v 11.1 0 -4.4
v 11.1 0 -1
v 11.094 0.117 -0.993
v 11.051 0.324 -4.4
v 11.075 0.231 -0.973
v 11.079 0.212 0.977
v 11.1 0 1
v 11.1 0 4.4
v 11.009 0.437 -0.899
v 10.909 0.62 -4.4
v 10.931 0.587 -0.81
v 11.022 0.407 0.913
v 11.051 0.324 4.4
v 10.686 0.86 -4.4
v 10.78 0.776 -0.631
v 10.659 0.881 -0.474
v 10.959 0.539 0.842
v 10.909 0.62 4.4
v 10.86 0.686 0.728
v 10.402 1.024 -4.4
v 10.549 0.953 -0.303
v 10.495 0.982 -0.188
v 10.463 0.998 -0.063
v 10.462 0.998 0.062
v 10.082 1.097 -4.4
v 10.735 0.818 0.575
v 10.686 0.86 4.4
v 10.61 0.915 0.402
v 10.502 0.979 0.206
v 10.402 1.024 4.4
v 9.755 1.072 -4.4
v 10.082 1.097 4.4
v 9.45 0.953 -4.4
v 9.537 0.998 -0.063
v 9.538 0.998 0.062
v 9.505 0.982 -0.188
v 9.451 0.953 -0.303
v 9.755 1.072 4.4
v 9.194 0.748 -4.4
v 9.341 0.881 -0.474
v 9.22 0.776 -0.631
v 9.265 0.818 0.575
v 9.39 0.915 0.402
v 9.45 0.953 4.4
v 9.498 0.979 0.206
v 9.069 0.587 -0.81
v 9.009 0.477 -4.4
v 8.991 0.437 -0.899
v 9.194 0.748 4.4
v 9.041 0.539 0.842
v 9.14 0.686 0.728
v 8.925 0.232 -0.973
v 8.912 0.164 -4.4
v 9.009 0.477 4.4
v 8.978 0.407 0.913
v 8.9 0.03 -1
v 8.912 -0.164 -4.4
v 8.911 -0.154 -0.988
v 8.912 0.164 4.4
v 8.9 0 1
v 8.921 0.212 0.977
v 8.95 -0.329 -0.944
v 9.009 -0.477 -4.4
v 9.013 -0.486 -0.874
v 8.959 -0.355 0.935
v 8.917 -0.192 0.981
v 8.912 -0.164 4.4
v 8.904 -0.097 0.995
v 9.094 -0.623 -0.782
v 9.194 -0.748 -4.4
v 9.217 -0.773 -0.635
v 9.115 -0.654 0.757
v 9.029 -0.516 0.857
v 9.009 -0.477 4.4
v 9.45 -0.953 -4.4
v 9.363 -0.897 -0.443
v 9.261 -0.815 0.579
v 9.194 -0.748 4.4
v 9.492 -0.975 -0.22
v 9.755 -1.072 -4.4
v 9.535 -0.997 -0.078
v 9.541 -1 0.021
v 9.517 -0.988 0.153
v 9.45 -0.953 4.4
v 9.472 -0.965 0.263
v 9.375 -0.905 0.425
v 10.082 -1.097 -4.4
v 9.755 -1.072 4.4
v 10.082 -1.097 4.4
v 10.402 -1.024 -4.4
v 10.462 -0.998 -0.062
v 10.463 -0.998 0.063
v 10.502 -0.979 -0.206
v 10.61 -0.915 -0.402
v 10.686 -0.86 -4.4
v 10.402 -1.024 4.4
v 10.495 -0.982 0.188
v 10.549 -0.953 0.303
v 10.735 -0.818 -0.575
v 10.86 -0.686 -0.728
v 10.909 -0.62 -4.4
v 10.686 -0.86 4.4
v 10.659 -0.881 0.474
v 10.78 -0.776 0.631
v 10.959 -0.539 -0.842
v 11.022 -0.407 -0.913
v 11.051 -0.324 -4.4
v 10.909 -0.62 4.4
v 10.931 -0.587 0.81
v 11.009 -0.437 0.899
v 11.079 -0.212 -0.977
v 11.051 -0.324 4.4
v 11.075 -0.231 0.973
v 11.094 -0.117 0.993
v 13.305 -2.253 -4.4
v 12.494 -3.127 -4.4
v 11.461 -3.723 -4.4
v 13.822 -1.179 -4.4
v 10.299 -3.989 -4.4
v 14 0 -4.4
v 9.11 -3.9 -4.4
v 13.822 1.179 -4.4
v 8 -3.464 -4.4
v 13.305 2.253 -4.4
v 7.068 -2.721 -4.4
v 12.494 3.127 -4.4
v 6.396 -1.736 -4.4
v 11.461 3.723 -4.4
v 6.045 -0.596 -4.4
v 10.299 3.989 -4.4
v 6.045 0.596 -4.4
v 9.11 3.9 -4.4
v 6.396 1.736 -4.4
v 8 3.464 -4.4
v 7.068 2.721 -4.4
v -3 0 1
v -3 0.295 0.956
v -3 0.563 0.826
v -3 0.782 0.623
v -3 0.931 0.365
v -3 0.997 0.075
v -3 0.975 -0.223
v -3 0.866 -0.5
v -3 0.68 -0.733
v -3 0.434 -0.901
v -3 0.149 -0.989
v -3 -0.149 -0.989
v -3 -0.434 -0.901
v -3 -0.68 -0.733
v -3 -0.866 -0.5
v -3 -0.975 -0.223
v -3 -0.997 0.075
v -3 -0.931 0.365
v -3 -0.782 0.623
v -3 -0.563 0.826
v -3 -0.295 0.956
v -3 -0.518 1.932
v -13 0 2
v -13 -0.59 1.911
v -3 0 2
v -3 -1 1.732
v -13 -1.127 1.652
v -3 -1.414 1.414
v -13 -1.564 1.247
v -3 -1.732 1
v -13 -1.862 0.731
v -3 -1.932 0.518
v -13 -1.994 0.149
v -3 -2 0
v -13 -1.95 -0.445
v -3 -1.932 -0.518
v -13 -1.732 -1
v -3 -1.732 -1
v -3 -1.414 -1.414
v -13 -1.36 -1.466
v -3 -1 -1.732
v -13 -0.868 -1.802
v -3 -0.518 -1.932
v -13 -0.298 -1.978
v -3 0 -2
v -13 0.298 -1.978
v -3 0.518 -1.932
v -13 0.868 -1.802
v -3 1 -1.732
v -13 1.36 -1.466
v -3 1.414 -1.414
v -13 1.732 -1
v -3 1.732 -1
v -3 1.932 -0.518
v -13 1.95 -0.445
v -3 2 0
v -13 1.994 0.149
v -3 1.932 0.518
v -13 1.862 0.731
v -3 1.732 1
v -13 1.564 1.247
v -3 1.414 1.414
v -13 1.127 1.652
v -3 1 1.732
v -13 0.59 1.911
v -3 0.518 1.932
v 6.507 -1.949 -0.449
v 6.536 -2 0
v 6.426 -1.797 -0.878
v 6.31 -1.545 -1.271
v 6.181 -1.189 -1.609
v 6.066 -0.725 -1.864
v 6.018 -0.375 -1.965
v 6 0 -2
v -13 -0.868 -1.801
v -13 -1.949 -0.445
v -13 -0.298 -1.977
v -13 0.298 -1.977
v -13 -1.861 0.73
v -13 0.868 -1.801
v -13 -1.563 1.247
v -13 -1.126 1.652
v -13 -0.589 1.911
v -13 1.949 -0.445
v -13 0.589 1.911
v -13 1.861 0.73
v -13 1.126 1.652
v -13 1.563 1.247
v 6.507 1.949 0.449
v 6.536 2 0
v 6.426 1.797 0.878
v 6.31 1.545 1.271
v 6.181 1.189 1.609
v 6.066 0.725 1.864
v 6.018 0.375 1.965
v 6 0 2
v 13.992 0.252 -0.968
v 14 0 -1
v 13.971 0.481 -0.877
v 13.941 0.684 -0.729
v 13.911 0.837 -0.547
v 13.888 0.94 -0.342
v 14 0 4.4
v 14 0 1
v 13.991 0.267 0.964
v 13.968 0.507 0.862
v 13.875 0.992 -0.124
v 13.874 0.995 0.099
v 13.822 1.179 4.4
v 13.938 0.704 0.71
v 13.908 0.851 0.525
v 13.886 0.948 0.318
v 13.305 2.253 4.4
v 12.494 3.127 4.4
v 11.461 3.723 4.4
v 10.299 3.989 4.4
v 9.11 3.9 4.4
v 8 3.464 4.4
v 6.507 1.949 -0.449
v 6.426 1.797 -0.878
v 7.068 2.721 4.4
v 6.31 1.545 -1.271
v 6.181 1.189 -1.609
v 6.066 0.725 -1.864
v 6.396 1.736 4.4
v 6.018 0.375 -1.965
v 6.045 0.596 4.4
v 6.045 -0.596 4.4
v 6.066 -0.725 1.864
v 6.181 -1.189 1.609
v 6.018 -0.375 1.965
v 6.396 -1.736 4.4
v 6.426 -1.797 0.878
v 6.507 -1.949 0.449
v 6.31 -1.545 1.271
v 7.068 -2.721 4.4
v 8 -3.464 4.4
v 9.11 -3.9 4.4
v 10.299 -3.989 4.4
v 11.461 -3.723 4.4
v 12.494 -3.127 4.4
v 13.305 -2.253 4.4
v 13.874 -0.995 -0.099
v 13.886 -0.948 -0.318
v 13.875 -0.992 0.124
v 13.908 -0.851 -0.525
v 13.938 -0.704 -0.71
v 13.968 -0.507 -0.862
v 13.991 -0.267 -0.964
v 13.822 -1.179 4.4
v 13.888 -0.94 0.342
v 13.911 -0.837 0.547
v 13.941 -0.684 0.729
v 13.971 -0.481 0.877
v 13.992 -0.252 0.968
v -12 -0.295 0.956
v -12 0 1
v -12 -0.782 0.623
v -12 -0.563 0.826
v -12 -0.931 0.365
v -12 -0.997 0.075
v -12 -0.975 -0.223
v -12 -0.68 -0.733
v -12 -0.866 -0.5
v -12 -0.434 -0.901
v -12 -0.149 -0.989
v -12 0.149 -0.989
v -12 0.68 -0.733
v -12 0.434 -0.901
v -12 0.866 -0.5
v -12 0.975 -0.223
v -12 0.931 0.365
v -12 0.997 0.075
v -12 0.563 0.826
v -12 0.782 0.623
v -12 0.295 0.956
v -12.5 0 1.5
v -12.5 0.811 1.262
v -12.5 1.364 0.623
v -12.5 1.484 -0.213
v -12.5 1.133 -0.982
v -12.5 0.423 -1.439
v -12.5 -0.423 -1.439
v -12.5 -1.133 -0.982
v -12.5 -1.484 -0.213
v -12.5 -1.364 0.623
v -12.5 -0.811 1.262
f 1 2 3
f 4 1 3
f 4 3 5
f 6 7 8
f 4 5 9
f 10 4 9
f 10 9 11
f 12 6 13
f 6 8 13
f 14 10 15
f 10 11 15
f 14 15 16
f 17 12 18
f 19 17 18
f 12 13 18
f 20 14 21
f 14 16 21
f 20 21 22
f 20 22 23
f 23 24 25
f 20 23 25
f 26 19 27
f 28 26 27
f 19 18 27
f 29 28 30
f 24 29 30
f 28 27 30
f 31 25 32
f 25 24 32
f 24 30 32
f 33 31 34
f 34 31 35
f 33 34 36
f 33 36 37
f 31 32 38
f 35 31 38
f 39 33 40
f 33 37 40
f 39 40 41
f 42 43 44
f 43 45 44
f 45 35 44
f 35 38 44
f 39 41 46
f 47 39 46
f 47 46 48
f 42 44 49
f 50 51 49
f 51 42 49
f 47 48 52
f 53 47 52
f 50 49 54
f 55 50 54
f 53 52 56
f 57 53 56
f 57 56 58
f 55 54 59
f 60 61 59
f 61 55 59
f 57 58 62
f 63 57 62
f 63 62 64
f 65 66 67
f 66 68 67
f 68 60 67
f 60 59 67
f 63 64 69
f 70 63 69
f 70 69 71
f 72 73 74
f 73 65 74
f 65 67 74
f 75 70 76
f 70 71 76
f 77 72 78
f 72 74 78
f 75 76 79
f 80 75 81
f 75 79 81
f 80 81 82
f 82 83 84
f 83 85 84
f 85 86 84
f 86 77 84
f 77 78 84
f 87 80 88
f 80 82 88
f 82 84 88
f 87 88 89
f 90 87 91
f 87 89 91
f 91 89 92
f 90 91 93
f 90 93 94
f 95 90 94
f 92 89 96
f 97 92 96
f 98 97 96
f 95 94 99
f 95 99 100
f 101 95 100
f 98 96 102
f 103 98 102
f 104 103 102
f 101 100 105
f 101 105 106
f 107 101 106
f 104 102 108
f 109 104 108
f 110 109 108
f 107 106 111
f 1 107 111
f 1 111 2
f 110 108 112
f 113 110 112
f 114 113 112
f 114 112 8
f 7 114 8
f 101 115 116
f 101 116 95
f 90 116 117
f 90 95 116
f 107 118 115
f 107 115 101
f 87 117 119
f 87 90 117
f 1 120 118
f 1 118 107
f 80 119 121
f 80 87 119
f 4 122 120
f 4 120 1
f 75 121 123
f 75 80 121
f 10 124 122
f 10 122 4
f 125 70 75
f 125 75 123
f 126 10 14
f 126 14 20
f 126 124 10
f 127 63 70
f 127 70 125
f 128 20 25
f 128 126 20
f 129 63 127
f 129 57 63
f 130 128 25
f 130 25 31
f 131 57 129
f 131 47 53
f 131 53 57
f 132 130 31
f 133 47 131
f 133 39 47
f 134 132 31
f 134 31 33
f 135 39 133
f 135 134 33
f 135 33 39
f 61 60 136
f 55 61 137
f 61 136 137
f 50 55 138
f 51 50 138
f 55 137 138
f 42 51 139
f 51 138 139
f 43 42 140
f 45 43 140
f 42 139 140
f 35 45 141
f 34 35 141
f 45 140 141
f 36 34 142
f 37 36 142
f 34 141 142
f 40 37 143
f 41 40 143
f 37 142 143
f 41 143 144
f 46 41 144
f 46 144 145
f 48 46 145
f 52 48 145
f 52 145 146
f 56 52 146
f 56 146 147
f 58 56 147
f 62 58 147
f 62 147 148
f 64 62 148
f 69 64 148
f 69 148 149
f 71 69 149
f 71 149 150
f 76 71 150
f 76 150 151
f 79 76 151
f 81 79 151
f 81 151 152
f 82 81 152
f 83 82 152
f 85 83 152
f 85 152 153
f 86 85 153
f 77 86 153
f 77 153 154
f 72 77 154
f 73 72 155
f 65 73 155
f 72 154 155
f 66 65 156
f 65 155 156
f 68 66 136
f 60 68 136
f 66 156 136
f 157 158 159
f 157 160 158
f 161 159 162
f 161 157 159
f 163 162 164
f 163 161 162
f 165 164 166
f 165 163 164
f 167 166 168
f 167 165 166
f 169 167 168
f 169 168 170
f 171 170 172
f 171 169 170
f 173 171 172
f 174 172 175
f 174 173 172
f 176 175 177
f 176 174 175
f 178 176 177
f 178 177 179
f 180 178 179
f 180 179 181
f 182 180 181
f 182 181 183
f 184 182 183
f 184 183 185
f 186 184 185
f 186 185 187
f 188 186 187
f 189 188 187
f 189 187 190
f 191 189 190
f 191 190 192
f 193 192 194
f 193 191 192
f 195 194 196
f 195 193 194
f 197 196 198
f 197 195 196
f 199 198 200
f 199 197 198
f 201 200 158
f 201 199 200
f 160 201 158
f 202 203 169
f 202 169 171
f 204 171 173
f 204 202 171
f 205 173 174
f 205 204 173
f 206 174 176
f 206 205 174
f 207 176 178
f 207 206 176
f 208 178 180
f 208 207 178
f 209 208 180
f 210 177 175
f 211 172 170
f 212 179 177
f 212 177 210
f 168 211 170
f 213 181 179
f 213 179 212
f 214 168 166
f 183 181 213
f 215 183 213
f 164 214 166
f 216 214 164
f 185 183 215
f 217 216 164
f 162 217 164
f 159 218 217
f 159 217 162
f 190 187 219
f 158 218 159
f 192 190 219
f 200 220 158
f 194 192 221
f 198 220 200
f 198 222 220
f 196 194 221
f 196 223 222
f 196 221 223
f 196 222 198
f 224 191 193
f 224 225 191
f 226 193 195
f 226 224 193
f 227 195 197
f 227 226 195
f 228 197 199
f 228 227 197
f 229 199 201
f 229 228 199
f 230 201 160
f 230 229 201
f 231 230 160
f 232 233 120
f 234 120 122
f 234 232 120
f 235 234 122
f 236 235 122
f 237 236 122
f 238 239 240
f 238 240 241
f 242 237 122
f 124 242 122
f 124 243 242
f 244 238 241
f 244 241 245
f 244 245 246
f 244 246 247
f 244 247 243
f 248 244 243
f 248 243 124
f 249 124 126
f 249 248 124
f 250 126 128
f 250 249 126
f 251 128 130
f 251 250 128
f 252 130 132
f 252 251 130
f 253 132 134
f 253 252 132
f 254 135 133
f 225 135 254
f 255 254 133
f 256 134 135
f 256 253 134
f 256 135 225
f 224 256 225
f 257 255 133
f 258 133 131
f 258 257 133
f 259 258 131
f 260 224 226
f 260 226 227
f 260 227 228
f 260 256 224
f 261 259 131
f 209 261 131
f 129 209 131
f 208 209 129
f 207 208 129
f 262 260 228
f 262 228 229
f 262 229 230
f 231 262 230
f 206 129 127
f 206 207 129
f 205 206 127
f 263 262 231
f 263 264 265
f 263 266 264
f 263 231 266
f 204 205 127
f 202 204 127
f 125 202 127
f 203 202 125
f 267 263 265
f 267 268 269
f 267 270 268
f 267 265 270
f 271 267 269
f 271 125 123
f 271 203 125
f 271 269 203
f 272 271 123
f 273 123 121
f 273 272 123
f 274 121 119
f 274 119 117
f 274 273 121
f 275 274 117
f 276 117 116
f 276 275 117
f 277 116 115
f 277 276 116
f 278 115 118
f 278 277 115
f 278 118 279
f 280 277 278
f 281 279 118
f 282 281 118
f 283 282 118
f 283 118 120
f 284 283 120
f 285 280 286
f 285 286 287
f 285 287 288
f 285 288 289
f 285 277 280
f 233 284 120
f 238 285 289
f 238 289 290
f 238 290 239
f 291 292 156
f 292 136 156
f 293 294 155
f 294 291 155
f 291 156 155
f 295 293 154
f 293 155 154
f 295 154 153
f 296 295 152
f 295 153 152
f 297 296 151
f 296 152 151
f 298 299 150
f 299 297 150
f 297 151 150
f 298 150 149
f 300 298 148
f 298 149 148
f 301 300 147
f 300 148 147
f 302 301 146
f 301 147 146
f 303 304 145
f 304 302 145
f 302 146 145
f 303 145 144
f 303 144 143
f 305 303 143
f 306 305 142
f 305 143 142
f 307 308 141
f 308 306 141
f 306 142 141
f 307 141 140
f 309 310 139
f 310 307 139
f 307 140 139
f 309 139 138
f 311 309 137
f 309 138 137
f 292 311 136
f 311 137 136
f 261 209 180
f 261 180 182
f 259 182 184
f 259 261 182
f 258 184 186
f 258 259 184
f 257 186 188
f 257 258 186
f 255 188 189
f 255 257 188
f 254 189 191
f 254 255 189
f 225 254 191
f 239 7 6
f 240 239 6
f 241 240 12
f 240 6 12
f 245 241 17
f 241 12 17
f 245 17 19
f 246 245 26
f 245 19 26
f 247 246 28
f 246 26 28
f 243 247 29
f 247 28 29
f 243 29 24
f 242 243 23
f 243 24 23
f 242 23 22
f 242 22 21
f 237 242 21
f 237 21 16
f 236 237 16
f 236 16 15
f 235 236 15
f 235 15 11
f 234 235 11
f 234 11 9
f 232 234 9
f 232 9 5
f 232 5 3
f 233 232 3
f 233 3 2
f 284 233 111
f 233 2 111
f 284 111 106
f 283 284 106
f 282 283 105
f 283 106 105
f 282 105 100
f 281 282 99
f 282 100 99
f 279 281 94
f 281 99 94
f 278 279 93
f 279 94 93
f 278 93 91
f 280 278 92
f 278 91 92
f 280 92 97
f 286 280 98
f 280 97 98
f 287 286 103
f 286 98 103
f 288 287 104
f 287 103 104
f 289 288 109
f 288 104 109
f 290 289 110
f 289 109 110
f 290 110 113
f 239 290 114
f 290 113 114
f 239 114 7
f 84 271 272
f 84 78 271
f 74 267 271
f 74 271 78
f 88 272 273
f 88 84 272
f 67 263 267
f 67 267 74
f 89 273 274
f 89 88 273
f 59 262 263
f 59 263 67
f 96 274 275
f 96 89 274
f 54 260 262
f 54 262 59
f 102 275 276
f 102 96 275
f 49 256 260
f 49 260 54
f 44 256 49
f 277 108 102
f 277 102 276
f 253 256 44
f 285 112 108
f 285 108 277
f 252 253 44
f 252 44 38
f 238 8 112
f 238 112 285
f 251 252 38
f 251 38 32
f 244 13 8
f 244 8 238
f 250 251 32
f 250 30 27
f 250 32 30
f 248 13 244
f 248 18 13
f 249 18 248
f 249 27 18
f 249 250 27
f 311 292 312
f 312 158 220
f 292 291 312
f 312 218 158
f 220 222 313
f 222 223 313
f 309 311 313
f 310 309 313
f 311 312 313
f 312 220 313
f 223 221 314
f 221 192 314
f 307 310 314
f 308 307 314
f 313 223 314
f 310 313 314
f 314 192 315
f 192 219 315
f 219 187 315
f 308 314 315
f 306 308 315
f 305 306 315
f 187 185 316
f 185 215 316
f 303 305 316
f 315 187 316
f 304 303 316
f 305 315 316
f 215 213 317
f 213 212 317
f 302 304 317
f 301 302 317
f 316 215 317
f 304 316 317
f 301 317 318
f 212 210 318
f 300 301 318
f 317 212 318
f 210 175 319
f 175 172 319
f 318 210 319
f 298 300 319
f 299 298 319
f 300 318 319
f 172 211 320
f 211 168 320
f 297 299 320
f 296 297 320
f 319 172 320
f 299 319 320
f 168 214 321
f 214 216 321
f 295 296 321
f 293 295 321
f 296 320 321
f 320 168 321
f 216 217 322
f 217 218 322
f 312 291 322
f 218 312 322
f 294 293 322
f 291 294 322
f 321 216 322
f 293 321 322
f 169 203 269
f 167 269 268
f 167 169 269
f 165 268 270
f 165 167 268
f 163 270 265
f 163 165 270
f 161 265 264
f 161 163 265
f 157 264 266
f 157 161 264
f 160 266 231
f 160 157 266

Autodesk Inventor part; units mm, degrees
ref_plane "YZ Plane" through (0, 0, 0) normal (1, 0, 0) x (0, 1, 0)
ref_plane "XZ Plane" through (0, 0, 0) normal (0, 1, 0) x (-1, 0, 0)
ref_plane "XY Plane" through (0, 0, 0) normal (0, 0, 1) x (1, 0, 0)
sketch "Sketch1" plane through (0, 0, 0) normal (0, 0, 1) x (1, 0, 0)
  circle A0 centre (-10, 0) radius 1
  circle A1 centre (10, 0) radius 1
  circle A2 centre (-10, 0) radius 4
  circle A3 centre (10, 0) radius 4
  point P0 (0, 0)
  dimension "d0" = 2
  dimension "d1" = 2
  dimension "d3" = 20
  dimension "d4" = 10
  dimension "d5" = 8
  dimension "d6" = 8
extrude "Extrusion1" add sketch "Sketch1" against normal mid plane 18
sketch "Sketch2" plane through (0, 0, 0) normal (0, 0, 1) x (1, 0, 0)
  circle A0 centre (-10, 0) radius 4 projected
  circle A1 centre (-10, 0) radius 1 projected
  point P0 (0, 0)
extrude "Extrusion2" cut sketch "Sketch2" against normal mid plane 9
sketch "Sketch3" plane through (-10, 0, -4.5) normal (0, 0, 1) x (1, 0, 0)
  circle A0 centre (20, 0) radius 4 projected
  circle A1 centre (20, 0) radius 4 projected
  circle A2 centre (20, 0) radius 1 projected
  point P0 (10, 0)
extrude "Extrusion3" cut sketch "Sketch3" against normal blind 4.5
mirror "Mirror1" about plane through (0, 0, 0) normal (0, 0, 1) of "Extrusion3"
sketch "Sketch6" plane through (0, 0, 0) normal (0, 1, 0) x (-1, 0, 0)
  line L0 (-6, -4.5) -> (-9, -4.5) construction
  line L1 (-9, -4.5) -> (-9, 4.5) construction
  line L2 (-9, 4.5) -> (-6, 4.5) construction
  line L3 (-6, 4.5) -> (-6, -4.5) construction
  line L4 (-11, -4.5) -> (-14, -4.5) construction
  line L5 (-14, -4.5) -> (-14, 4.5) construction
  line L6 (-14, 4.5) -> (-11, 4.5) construction
  line L7 (-11, 4.5) -> (-11, -4.5) construction
  line L8 (6, 9) -> (9, 9) construction
  line L9 (9, 9) -> (9, 4.5) construction
  line L10 (9, 4.5) -> (6, 4.5) construction
  line L11 (6, 4.5) -> (6, 9) construction
  line L12 (11, 9) -> (14, 9) construction
  line L13 (14, 9) -> (14, 4.5) construction
  line L14 (14, 4.5) -> (11, 4.5) construction
  line L15 (11, 4.5) -> (11, 9) construction
  line L16 (14, -9) -> (11, -9) construction
  line L17 (11, -9) -> (11, -4.5) construction
  line L18 (11, -4.5) -> (14, -4.5) construction
  line L19 (14, -4.5) -> (14, -9) construction
  line L20 (9, -9) -> (6, -9) construction
  line L21 (6, -9) -> (6, -4.5) construction
  line L22 (6, -4.5) -> (9, -4.5) construction
  line L23 (9, -4.5) -> (9, -9) construction
  line L24 (6, -9) -> (14, -9) construction
  line L25 (6, -9) -> (3, -9)
  line L26 (3, -9) -> (3, -2)
  line L27 (3, -2) -> (-6, -2)
  line L28 (-6, 4.5) -> (-6, -4.5) construction
  line L29 (-6, 2) -> (3, 2)
  line L30 (3, 2) -> (3, 9)
  line L31 (3, 9) -> (6, 9)
  line L32 (6, -4.5) -> (14, -4.5) construction
  line L33 (6, -4.5) -> (6, 4.5)
  line L34 (-6, -2) -> (-9, -2)
  line L35 (-9, -4.5) -> (-9, 4.5) projected
  line L36 (-6, 2) -> (-9, 2)
  line L37 (6, -9) -> (9, -9)
  line L38 (9, -4.5) -> (6, -4.5)
  line L39 (11, -4.5) -> (9, -4.5) projected
  line L40 (9, -4.5) -> (9, -9)
  line L41 (9, -9) -> (9, -4.5) projected
  line L42 (9, 4.5) -> (11, 4.5) projected
  line L43 (14, 4.5) -> (6, 4.5) projected
  line L44 (9, 4.5) -> (6, 4.5)
  line L45 (9, 9) -> (11, 9) projected
  line L46 (9, 4.5) -> (9, 9)
  line L47 (14, 9) -> (6, 9) projected
  line L48 (9, 9) -> (6, 9)
  point P0 (0, 0)
  dimension "d16" = 3
  dimension "d17" = 4
  dimension "d18" = 2
extrude "Extrusion4" add sketch "Sketch6" against normal mid plane 4
sketch "Sketch7" plane through (-6, -2, -4.5) normal (-1, 0, 0) x (0, 0, 1)
  circle A0 centre (4.5, 2) radius 1
  dimension "d21" = 2
extrude "Extrusion5" cut sketch "Sketch7" against normal blind 20
chamfer "Chamfer1" distance 1 angle 45 1 edges at (-6, 0, -1)
fillet "Fillet1" radius 2 4 edges at (1.7679, 2, 2) (1.7679, 2, -2) (1.7679, -2, -2) (1.7679, -2, 2)
sketch "Sketch9" plane through (0, 0, 9) normal (0, 0, 1) x (1, 0, 0)
  circle A0 centre (-10, 0) radius 1 projected
  circle A1 centre (-10, 0) radius 0.9
  point P0 (0, 0)
  dimension "d29" = 1.8
extrude "TREAD" add sketch "Sketch9" against normal up to surface (4.5 mm away)
sketch "Sketch11" plane through (10, 0, 4.5) normal (0, 0, 1) x (1, 0, 0)
  circle A0 centre (0, 0) radius 4 projected
  circle A1 centre (0, 0) radius 1 projected
  point P0 (-10, 0)
extrude "thin" cut sketch "Sketch11" against normal blind 0.1
mirror "Mirror2" about plane through (0, 0, 0) normal (0, 0, 1) of "thin"
sketch "Sketch12" plane through (10, 0, 4.4) normal (0, 0, 1) x (1, 0, 0)
  circle A0 centre (0, 0) radius 1 construction
  circle A1 centre (0, 0) radius 1.1
  point P0 (-10, 0)
  dimension "d34" = 2.2
extrude "Extrusion8" cut sketch "Sketch12" against normal up to surface (8.8 mm away)
sketch "Sketch13" plane through (0, 0, 9) normal (0, 0, 1) x (1, 0, 0)
  circle A0 centre (-10, 0) radius 0.9 projected
  arc A1 (-6.5359, 2) -> (-6.5359, -2) centre (-10, 0) ccw projected
  line L0 (-3, -2) -> (-6.5359, -2) projected
  line L1 (-3, -2) -> (-3, 2) projected
  line L2 (-6.5359, 2) -> (-3, 2) projected
  point P0 (0, 0)
extrude "Extrusion9" cut sketch "Sketch13" against normal through all
sketch "Sketch14" plane through (-3, 0, 0) normal (-1, 0, 0) x (0, 0, 1)
  circle A0 centre (0, 0) radius 2 projected
  circle A1 centre (0, 0) radius 1 projected
extrude "Extrusion10" add sketch "Sketch14" along normal blind 10
chamfer "Chamfer2" distance 1 angle 45 1 edges at (-13, 0, -1)
equation "\"d4\" = 0.5 * d3"
equation "\"d6\" = d5"
equation "\"d18\" = 0.5 * d17"
properties part number "Tolerenced_Phalalnge_20_TIPmm"
